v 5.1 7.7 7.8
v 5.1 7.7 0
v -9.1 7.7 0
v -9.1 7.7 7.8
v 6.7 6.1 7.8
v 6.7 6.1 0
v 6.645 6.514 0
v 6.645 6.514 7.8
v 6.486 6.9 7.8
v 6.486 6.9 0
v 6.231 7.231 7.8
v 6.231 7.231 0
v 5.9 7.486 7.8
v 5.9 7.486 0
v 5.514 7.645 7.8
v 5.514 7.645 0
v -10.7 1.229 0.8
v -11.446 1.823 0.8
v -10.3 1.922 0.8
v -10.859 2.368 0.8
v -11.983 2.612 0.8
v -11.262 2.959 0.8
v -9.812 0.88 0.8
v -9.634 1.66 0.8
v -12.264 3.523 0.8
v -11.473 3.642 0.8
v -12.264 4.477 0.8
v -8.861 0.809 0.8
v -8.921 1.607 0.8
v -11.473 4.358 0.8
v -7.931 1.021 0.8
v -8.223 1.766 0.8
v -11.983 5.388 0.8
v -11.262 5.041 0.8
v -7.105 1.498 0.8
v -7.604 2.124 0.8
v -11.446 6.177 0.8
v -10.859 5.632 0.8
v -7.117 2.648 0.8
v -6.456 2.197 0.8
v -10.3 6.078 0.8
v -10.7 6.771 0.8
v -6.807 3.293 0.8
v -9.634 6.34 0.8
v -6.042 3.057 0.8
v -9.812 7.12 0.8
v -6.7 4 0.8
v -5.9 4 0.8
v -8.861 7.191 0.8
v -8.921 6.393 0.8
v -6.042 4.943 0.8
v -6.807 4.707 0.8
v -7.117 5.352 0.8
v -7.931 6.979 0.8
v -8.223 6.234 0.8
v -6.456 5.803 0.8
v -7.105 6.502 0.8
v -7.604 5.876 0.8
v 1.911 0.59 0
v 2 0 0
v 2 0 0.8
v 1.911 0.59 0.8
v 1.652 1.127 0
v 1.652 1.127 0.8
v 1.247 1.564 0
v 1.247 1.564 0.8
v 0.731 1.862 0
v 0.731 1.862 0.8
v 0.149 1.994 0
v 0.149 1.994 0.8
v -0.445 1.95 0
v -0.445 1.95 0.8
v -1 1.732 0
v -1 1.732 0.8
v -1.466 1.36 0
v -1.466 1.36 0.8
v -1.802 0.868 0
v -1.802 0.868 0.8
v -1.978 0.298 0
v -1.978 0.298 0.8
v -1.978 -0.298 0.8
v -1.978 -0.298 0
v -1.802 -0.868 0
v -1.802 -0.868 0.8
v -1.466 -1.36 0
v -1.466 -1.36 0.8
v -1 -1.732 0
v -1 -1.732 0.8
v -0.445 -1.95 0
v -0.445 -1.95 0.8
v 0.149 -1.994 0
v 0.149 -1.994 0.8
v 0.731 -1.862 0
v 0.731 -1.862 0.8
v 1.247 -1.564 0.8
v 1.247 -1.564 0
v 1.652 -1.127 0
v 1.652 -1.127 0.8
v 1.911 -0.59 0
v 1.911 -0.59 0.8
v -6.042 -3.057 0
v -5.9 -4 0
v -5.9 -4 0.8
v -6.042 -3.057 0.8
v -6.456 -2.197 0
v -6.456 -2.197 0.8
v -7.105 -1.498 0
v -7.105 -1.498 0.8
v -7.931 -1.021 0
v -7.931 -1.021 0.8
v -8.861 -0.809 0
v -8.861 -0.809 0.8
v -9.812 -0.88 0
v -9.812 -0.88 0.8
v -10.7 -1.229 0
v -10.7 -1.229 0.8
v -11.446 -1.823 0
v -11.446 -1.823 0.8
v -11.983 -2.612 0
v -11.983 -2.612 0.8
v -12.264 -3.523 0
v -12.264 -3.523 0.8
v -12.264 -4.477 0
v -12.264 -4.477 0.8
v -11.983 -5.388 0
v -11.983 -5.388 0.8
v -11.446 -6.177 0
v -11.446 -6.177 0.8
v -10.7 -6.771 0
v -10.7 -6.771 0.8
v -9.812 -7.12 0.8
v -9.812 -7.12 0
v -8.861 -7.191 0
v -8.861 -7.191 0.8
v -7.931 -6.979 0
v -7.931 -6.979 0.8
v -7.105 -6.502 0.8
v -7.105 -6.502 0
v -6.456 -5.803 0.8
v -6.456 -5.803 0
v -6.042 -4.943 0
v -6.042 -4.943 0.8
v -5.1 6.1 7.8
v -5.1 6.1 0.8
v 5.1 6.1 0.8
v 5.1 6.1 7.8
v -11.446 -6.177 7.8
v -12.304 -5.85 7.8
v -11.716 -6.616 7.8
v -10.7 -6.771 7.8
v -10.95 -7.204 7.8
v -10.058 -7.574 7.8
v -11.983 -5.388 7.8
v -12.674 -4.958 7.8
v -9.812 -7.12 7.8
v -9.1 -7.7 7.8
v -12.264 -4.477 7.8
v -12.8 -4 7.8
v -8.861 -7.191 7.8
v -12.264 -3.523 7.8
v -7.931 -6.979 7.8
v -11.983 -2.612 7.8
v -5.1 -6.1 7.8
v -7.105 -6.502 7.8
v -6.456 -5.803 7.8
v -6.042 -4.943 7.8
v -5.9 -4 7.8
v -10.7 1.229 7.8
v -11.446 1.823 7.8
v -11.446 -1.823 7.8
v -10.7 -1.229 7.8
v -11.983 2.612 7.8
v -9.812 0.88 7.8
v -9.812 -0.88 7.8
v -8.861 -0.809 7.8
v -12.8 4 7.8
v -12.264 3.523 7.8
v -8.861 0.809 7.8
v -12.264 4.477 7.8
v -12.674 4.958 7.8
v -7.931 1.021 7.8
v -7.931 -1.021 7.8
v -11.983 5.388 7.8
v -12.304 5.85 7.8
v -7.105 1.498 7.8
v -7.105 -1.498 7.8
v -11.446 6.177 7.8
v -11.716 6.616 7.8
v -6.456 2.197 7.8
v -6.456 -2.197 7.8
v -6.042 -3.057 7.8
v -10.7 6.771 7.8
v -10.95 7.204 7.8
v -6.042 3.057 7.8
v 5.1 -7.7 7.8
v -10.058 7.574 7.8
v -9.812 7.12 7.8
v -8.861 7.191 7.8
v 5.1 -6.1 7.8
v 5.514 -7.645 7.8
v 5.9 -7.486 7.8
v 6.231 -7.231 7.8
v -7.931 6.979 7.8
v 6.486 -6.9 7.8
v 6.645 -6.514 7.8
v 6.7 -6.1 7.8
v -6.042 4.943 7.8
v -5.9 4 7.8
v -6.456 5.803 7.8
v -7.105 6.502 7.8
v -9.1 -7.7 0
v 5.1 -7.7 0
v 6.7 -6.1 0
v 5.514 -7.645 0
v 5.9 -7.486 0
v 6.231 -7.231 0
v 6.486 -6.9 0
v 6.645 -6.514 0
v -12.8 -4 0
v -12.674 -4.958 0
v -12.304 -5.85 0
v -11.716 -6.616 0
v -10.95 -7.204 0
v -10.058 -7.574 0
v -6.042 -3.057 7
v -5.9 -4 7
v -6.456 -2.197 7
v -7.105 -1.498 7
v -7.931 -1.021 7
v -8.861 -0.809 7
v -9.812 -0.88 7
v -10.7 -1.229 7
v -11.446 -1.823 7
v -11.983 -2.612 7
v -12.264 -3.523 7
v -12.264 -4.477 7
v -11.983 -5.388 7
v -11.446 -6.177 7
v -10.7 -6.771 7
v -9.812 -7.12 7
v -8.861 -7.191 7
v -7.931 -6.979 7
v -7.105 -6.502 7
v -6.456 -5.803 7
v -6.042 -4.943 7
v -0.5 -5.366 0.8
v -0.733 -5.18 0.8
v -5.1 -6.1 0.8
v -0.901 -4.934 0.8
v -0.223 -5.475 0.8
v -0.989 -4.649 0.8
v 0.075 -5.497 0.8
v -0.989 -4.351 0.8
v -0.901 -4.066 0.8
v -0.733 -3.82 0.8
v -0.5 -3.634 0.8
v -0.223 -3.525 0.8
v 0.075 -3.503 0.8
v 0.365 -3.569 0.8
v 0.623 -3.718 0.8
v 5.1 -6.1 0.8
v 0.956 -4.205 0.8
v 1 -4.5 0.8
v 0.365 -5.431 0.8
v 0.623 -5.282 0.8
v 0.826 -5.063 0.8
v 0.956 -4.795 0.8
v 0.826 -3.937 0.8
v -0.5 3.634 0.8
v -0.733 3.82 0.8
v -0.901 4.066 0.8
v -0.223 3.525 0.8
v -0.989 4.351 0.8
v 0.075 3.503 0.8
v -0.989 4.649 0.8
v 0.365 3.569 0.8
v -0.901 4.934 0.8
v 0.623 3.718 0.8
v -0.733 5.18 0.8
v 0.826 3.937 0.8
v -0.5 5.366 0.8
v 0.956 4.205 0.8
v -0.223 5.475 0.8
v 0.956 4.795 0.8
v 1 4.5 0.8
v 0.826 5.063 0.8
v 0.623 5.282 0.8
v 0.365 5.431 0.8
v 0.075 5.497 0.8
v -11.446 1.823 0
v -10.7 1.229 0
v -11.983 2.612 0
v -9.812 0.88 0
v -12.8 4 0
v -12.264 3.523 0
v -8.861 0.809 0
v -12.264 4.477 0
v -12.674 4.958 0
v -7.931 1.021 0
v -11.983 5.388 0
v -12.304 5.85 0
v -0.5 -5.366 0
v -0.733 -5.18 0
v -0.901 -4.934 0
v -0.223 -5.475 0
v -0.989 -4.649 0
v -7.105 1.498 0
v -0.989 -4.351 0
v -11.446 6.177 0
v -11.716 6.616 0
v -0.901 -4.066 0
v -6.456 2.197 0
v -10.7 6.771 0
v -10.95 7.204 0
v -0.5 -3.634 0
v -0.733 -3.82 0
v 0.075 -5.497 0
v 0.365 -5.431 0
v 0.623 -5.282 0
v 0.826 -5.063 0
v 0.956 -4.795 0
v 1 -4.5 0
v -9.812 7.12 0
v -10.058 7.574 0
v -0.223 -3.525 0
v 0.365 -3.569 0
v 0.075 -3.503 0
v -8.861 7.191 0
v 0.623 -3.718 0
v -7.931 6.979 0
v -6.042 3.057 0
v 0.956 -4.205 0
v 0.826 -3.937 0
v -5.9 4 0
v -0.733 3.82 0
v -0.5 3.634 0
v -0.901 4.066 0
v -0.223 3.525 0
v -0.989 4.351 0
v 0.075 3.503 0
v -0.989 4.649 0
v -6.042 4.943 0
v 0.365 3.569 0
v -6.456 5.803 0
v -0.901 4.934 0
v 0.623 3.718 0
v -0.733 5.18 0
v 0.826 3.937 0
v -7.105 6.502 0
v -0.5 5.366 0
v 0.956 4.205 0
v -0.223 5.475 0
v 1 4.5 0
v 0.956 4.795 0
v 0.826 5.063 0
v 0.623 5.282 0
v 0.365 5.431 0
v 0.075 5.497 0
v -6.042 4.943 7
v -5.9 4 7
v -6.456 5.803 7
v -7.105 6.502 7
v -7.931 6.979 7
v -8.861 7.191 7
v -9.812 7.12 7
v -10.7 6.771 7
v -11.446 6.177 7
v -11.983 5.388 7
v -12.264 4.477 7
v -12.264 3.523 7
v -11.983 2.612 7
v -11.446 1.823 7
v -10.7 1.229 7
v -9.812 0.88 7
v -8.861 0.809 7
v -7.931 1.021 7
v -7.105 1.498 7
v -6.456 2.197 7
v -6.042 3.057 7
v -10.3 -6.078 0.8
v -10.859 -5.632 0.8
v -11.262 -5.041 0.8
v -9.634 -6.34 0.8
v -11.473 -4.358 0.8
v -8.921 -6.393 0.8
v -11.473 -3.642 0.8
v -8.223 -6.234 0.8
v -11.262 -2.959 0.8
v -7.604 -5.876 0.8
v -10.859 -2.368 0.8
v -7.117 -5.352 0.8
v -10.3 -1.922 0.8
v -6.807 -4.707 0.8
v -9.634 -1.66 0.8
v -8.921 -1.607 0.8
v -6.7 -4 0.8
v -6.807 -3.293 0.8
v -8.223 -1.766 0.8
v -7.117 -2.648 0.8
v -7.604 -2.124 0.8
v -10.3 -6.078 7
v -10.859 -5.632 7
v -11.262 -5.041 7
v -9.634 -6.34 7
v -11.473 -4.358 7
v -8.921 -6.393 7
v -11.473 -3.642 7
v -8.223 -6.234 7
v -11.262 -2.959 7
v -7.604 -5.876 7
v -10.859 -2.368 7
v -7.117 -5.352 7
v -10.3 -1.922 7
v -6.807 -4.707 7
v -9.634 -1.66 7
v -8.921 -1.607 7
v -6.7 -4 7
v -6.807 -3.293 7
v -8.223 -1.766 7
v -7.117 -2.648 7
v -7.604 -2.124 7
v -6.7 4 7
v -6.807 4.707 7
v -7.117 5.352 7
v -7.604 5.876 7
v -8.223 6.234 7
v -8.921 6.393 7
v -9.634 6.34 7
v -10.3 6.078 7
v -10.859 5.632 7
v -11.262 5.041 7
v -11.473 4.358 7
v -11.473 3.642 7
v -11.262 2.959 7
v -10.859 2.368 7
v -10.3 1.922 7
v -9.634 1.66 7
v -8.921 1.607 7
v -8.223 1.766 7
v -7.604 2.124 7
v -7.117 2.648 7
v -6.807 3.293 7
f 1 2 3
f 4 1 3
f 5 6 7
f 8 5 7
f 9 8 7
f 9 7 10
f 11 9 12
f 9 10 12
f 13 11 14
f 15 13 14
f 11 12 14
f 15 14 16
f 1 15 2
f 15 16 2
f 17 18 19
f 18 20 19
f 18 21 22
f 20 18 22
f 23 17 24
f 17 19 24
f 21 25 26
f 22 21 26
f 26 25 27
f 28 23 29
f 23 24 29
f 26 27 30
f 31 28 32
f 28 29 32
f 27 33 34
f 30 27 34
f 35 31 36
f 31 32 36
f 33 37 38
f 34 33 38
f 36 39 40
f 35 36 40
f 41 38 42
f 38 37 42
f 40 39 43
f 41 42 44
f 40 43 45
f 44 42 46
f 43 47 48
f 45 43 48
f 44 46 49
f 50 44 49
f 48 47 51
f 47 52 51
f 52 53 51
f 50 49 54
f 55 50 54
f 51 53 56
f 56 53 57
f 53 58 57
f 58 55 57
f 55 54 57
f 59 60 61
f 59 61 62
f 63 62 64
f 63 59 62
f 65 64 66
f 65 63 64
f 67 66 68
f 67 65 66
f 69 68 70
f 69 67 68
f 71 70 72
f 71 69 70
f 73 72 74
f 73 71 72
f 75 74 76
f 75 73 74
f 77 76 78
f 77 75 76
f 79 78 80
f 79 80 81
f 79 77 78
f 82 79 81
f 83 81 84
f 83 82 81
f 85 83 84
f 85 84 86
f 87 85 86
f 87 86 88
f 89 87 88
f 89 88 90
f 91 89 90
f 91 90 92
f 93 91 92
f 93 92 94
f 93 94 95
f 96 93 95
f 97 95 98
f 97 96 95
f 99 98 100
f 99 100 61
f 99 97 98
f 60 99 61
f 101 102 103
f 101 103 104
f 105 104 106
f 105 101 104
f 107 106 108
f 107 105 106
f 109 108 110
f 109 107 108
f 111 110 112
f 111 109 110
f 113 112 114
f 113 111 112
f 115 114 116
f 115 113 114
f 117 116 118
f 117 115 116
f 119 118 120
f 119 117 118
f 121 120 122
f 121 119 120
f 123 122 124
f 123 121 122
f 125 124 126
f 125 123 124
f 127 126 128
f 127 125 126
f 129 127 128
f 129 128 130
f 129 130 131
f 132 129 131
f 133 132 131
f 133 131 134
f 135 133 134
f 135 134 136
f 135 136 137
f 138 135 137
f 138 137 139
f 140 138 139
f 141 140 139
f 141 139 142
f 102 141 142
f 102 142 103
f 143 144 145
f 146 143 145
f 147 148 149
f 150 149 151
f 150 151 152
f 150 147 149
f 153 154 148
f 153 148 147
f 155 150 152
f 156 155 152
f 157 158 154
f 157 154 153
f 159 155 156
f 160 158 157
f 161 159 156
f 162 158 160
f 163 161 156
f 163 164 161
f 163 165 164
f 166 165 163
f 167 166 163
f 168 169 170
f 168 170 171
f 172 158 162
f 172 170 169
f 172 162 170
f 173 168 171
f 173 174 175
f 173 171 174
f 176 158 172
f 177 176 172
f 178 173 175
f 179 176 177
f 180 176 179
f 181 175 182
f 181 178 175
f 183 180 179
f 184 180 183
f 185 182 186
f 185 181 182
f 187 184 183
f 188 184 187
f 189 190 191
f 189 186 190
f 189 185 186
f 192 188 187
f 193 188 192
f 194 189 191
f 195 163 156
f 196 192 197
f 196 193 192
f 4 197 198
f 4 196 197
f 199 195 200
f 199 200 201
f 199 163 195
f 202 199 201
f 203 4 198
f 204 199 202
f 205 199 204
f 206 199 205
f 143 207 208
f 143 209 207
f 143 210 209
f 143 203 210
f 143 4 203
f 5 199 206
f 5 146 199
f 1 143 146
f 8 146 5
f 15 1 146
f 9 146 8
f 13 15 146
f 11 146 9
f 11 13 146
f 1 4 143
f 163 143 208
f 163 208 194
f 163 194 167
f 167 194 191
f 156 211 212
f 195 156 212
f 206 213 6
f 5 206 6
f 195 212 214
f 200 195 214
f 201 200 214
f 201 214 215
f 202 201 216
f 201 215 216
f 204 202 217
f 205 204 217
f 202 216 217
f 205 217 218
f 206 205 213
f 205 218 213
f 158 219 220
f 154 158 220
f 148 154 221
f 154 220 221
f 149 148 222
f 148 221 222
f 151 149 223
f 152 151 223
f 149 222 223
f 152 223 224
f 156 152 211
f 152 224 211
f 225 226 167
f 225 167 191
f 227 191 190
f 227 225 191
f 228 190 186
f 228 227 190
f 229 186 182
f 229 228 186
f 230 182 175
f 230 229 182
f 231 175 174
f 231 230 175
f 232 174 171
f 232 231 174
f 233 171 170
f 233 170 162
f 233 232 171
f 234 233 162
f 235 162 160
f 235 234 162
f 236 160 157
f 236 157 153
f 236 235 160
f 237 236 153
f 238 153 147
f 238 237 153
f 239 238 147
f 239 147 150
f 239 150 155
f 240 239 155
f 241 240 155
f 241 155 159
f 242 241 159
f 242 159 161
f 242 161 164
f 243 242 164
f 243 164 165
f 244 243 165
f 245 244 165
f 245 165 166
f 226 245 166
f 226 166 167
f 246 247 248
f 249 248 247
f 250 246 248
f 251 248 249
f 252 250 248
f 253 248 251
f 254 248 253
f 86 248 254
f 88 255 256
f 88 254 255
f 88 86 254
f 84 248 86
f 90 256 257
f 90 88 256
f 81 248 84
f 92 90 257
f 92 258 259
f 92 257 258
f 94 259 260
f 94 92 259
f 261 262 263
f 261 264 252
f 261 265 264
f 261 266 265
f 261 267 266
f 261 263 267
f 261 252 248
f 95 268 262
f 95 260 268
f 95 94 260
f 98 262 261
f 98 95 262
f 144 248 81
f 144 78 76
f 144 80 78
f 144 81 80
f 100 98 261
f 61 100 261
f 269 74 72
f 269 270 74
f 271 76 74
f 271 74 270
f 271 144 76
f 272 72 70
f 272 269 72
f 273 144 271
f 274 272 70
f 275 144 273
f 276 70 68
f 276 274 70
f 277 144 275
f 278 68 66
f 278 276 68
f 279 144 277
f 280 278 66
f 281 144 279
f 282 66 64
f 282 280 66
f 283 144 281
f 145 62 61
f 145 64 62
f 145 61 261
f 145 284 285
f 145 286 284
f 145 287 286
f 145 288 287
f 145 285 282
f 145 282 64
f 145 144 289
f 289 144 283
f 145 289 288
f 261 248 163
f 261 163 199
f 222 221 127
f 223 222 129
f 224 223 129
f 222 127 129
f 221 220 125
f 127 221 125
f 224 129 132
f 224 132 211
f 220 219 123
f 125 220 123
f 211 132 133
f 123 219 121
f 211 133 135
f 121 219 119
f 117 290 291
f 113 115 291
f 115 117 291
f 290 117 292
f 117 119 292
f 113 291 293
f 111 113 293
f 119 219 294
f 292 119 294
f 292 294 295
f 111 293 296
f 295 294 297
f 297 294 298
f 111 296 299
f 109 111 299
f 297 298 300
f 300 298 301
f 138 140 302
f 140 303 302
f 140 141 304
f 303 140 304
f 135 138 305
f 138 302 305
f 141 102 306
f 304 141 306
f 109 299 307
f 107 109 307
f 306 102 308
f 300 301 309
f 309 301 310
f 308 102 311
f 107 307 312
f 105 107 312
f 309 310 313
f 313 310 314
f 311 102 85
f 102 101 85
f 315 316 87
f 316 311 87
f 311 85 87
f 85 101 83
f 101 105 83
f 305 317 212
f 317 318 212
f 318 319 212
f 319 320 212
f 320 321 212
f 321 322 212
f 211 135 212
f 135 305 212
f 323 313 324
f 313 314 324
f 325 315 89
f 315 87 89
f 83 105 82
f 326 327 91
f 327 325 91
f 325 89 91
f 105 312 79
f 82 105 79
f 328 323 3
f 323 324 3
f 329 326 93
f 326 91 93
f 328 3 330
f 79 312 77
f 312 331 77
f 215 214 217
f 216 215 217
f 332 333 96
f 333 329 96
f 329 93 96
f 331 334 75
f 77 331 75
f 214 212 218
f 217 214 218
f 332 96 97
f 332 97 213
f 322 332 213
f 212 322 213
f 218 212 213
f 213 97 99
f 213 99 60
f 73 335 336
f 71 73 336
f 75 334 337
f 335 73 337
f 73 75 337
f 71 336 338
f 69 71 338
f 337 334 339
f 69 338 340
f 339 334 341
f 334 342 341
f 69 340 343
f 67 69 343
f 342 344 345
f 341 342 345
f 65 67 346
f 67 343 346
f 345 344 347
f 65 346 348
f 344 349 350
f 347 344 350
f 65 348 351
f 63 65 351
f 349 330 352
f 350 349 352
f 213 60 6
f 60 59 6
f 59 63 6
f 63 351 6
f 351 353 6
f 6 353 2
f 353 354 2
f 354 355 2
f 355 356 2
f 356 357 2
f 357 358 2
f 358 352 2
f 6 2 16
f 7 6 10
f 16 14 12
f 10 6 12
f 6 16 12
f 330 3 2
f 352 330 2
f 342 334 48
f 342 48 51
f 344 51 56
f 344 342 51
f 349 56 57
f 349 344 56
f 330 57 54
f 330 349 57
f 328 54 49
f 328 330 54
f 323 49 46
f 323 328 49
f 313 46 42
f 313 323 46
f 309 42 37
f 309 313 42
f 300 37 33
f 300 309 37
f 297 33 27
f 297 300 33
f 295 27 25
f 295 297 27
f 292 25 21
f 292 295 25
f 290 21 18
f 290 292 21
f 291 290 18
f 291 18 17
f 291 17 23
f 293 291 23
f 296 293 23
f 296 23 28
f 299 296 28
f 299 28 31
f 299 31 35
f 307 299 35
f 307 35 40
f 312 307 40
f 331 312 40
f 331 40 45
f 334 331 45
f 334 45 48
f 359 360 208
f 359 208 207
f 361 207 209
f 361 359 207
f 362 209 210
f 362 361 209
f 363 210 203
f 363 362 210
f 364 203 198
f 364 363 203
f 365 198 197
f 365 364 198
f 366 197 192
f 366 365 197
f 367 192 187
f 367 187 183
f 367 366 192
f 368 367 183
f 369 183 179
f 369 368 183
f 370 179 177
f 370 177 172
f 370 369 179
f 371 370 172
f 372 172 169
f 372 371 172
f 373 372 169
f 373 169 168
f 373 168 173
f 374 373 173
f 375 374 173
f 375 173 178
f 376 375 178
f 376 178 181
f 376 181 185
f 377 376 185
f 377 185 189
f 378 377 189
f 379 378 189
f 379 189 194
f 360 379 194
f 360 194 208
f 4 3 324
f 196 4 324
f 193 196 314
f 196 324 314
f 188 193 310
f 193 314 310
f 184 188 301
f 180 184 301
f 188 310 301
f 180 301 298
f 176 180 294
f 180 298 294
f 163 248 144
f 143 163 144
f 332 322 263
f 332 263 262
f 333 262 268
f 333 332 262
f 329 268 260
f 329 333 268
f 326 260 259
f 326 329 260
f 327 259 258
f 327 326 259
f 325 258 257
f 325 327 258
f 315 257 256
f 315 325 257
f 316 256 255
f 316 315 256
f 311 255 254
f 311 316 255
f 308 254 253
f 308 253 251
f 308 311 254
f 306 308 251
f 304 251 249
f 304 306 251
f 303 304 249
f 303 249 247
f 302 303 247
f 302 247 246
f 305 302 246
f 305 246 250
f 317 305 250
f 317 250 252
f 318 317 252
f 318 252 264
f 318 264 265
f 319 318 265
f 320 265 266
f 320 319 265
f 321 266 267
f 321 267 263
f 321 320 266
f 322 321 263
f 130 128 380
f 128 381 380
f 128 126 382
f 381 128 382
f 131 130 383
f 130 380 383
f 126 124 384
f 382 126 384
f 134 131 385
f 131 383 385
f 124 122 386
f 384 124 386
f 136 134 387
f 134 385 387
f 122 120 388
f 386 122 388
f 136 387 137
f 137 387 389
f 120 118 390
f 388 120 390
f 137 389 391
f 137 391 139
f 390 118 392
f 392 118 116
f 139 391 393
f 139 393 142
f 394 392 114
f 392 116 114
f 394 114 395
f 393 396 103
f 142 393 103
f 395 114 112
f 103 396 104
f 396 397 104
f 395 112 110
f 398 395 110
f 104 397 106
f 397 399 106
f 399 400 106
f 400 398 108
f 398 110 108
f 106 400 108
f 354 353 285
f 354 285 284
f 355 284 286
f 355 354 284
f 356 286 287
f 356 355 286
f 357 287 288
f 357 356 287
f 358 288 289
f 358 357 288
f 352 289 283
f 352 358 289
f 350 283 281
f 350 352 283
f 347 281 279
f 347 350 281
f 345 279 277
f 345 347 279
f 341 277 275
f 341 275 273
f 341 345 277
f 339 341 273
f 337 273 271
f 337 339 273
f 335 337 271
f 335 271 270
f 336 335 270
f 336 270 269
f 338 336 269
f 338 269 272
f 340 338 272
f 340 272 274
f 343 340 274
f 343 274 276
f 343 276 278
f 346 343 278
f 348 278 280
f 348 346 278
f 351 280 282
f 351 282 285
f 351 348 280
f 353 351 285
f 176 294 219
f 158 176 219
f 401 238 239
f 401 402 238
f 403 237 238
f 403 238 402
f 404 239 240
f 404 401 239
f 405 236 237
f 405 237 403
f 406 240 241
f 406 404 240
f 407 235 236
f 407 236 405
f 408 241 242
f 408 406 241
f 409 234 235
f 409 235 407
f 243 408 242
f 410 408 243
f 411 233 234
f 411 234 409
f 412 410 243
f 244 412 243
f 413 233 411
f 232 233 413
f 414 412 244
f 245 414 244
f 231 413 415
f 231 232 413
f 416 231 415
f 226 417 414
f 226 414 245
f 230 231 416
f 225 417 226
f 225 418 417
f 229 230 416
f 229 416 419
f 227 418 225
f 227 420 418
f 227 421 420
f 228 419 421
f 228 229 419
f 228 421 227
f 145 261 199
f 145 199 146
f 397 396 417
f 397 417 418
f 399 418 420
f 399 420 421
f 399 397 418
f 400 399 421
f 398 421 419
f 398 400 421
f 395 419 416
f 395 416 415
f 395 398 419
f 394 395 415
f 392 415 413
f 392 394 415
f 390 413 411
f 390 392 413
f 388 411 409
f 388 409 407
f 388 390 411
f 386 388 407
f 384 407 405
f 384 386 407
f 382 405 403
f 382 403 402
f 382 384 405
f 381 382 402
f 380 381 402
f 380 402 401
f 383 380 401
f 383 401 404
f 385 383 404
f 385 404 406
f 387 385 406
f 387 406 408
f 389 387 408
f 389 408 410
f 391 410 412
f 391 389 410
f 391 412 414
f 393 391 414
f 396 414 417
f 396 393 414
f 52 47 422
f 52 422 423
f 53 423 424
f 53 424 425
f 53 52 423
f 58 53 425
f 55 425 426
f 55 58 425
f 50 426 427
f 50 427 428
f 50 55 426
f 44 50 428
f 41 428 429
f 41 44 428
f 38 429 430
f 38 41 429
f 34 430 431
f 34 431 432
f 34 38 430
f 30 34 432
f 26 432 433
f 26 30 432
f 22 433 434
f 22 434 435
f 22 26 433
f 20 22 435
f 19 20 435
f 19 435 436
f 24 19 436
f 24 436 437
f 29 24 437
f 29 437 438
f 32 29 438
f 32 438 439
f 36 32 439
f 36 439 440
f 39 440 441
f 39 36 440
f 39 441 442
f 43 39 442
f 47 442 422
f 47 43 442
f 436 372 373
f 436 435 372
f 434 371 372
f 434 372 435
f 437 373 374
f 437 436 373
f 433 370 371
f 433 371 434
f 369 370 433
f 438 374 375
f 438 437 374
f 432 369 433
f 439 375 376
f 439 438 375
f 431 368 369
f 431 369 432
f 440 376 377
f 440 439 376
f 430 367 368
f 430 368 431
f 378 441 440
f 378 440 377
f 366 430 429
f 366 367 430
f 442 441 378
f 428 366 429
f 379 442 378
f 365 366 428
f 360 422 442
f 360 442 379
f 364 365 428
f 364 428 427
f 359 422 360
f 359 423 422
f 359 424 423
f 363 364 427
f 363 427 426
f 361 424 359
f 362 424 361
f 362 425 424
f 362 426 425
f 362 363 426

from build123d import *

# Parameters (mm, degrees)
F0_R     = 3.2
F0_W     = 10.2
F0_H     = 12.2
F1_DEPTH = 7.8
F2_START = 0.8
F0_R_2   = 2.4
F2_DEPTH = 6.2
F0_R_3   = 1
F0_R_4   = 2
F3_DEPTH = 0.8


# Not quite as in the source:
# - a feature names something its author has since deleted; it is built from what else it names


with BuildPart() as f1:
    # F0 (on Top) → F1 (new body)
    with BuildSketch(Plane.XY):
        with BuildLine():
            Line((5.1, 7.7), (-9.1, 7.7))
            ThreePointArc((-9.1, 7.7), (-11.7162950904, 6.6162950904), (-12.8, 4))
            Line((-12.8, 4), (-12.8, -4))
            ThreePointArc((-12.8, -4), (-11.7162950904, -6.6162950904), (-9.1, -7.7))
            Line((-9.1, -7.7), (5.1, -7.7))
            ThreePointArc((5.1, -7.7), (6.2313708499, -7.2313708499), (6.7, -6.1))
            Line((6.7, -6.1), (6.7, 6.1))
            ThreePointArc((6.7, 6.1), (6.2313708499, 7.2313708499), (5.1, 7.7))
        make_face()
        with Locations((-9.1, -4)):
            Circle(F0_R, mode=Mode.SUBTRACT)
        with Locations((-9.1, 4)):
            Circle(F0_R, mode=Mode.SUBTRACT)
        Rectangle(F0_W, F0_H, mode=Mode.SUBTRACT)
    extrude(amount=F1_DEPTH)

    # F0 (on Top) → F2 (join)
    with BuildSketch(Plane.XY.offset(F2_START)):
        with Locations((-9.1, -4)):
            Circle(F0_R)
        with Locations((-9.1, -4)):
            Circle(F0_R_2, mode=Mode.SUBTRACT)
        with Locations((-9.1, 4)):
            Circle(F0_R)
        with Locations((-9.1, 4)):
            Circle(F0_R_2, mode=Mode.SUBTRACT)
    extrude(amount=F2_DEPTH)

    # F0 (on Top) → F3 (join)
    with BuildSketch(Plane.XY):
        Rectangle(F0_W, F0_H)
        with Locations((0, -4.5)):
            Circle(F0_R_3, mode=Mode.SUBTRACT)
        Circle(F0_R_4, mode=Mode.SUBTRACT)
        with Locations((0, 4.5)):
            Circle(F0_R_3, mode=Mode.SUBTRACT)
    extrude(amount=F3_DEPTH)


solid = f1.part
